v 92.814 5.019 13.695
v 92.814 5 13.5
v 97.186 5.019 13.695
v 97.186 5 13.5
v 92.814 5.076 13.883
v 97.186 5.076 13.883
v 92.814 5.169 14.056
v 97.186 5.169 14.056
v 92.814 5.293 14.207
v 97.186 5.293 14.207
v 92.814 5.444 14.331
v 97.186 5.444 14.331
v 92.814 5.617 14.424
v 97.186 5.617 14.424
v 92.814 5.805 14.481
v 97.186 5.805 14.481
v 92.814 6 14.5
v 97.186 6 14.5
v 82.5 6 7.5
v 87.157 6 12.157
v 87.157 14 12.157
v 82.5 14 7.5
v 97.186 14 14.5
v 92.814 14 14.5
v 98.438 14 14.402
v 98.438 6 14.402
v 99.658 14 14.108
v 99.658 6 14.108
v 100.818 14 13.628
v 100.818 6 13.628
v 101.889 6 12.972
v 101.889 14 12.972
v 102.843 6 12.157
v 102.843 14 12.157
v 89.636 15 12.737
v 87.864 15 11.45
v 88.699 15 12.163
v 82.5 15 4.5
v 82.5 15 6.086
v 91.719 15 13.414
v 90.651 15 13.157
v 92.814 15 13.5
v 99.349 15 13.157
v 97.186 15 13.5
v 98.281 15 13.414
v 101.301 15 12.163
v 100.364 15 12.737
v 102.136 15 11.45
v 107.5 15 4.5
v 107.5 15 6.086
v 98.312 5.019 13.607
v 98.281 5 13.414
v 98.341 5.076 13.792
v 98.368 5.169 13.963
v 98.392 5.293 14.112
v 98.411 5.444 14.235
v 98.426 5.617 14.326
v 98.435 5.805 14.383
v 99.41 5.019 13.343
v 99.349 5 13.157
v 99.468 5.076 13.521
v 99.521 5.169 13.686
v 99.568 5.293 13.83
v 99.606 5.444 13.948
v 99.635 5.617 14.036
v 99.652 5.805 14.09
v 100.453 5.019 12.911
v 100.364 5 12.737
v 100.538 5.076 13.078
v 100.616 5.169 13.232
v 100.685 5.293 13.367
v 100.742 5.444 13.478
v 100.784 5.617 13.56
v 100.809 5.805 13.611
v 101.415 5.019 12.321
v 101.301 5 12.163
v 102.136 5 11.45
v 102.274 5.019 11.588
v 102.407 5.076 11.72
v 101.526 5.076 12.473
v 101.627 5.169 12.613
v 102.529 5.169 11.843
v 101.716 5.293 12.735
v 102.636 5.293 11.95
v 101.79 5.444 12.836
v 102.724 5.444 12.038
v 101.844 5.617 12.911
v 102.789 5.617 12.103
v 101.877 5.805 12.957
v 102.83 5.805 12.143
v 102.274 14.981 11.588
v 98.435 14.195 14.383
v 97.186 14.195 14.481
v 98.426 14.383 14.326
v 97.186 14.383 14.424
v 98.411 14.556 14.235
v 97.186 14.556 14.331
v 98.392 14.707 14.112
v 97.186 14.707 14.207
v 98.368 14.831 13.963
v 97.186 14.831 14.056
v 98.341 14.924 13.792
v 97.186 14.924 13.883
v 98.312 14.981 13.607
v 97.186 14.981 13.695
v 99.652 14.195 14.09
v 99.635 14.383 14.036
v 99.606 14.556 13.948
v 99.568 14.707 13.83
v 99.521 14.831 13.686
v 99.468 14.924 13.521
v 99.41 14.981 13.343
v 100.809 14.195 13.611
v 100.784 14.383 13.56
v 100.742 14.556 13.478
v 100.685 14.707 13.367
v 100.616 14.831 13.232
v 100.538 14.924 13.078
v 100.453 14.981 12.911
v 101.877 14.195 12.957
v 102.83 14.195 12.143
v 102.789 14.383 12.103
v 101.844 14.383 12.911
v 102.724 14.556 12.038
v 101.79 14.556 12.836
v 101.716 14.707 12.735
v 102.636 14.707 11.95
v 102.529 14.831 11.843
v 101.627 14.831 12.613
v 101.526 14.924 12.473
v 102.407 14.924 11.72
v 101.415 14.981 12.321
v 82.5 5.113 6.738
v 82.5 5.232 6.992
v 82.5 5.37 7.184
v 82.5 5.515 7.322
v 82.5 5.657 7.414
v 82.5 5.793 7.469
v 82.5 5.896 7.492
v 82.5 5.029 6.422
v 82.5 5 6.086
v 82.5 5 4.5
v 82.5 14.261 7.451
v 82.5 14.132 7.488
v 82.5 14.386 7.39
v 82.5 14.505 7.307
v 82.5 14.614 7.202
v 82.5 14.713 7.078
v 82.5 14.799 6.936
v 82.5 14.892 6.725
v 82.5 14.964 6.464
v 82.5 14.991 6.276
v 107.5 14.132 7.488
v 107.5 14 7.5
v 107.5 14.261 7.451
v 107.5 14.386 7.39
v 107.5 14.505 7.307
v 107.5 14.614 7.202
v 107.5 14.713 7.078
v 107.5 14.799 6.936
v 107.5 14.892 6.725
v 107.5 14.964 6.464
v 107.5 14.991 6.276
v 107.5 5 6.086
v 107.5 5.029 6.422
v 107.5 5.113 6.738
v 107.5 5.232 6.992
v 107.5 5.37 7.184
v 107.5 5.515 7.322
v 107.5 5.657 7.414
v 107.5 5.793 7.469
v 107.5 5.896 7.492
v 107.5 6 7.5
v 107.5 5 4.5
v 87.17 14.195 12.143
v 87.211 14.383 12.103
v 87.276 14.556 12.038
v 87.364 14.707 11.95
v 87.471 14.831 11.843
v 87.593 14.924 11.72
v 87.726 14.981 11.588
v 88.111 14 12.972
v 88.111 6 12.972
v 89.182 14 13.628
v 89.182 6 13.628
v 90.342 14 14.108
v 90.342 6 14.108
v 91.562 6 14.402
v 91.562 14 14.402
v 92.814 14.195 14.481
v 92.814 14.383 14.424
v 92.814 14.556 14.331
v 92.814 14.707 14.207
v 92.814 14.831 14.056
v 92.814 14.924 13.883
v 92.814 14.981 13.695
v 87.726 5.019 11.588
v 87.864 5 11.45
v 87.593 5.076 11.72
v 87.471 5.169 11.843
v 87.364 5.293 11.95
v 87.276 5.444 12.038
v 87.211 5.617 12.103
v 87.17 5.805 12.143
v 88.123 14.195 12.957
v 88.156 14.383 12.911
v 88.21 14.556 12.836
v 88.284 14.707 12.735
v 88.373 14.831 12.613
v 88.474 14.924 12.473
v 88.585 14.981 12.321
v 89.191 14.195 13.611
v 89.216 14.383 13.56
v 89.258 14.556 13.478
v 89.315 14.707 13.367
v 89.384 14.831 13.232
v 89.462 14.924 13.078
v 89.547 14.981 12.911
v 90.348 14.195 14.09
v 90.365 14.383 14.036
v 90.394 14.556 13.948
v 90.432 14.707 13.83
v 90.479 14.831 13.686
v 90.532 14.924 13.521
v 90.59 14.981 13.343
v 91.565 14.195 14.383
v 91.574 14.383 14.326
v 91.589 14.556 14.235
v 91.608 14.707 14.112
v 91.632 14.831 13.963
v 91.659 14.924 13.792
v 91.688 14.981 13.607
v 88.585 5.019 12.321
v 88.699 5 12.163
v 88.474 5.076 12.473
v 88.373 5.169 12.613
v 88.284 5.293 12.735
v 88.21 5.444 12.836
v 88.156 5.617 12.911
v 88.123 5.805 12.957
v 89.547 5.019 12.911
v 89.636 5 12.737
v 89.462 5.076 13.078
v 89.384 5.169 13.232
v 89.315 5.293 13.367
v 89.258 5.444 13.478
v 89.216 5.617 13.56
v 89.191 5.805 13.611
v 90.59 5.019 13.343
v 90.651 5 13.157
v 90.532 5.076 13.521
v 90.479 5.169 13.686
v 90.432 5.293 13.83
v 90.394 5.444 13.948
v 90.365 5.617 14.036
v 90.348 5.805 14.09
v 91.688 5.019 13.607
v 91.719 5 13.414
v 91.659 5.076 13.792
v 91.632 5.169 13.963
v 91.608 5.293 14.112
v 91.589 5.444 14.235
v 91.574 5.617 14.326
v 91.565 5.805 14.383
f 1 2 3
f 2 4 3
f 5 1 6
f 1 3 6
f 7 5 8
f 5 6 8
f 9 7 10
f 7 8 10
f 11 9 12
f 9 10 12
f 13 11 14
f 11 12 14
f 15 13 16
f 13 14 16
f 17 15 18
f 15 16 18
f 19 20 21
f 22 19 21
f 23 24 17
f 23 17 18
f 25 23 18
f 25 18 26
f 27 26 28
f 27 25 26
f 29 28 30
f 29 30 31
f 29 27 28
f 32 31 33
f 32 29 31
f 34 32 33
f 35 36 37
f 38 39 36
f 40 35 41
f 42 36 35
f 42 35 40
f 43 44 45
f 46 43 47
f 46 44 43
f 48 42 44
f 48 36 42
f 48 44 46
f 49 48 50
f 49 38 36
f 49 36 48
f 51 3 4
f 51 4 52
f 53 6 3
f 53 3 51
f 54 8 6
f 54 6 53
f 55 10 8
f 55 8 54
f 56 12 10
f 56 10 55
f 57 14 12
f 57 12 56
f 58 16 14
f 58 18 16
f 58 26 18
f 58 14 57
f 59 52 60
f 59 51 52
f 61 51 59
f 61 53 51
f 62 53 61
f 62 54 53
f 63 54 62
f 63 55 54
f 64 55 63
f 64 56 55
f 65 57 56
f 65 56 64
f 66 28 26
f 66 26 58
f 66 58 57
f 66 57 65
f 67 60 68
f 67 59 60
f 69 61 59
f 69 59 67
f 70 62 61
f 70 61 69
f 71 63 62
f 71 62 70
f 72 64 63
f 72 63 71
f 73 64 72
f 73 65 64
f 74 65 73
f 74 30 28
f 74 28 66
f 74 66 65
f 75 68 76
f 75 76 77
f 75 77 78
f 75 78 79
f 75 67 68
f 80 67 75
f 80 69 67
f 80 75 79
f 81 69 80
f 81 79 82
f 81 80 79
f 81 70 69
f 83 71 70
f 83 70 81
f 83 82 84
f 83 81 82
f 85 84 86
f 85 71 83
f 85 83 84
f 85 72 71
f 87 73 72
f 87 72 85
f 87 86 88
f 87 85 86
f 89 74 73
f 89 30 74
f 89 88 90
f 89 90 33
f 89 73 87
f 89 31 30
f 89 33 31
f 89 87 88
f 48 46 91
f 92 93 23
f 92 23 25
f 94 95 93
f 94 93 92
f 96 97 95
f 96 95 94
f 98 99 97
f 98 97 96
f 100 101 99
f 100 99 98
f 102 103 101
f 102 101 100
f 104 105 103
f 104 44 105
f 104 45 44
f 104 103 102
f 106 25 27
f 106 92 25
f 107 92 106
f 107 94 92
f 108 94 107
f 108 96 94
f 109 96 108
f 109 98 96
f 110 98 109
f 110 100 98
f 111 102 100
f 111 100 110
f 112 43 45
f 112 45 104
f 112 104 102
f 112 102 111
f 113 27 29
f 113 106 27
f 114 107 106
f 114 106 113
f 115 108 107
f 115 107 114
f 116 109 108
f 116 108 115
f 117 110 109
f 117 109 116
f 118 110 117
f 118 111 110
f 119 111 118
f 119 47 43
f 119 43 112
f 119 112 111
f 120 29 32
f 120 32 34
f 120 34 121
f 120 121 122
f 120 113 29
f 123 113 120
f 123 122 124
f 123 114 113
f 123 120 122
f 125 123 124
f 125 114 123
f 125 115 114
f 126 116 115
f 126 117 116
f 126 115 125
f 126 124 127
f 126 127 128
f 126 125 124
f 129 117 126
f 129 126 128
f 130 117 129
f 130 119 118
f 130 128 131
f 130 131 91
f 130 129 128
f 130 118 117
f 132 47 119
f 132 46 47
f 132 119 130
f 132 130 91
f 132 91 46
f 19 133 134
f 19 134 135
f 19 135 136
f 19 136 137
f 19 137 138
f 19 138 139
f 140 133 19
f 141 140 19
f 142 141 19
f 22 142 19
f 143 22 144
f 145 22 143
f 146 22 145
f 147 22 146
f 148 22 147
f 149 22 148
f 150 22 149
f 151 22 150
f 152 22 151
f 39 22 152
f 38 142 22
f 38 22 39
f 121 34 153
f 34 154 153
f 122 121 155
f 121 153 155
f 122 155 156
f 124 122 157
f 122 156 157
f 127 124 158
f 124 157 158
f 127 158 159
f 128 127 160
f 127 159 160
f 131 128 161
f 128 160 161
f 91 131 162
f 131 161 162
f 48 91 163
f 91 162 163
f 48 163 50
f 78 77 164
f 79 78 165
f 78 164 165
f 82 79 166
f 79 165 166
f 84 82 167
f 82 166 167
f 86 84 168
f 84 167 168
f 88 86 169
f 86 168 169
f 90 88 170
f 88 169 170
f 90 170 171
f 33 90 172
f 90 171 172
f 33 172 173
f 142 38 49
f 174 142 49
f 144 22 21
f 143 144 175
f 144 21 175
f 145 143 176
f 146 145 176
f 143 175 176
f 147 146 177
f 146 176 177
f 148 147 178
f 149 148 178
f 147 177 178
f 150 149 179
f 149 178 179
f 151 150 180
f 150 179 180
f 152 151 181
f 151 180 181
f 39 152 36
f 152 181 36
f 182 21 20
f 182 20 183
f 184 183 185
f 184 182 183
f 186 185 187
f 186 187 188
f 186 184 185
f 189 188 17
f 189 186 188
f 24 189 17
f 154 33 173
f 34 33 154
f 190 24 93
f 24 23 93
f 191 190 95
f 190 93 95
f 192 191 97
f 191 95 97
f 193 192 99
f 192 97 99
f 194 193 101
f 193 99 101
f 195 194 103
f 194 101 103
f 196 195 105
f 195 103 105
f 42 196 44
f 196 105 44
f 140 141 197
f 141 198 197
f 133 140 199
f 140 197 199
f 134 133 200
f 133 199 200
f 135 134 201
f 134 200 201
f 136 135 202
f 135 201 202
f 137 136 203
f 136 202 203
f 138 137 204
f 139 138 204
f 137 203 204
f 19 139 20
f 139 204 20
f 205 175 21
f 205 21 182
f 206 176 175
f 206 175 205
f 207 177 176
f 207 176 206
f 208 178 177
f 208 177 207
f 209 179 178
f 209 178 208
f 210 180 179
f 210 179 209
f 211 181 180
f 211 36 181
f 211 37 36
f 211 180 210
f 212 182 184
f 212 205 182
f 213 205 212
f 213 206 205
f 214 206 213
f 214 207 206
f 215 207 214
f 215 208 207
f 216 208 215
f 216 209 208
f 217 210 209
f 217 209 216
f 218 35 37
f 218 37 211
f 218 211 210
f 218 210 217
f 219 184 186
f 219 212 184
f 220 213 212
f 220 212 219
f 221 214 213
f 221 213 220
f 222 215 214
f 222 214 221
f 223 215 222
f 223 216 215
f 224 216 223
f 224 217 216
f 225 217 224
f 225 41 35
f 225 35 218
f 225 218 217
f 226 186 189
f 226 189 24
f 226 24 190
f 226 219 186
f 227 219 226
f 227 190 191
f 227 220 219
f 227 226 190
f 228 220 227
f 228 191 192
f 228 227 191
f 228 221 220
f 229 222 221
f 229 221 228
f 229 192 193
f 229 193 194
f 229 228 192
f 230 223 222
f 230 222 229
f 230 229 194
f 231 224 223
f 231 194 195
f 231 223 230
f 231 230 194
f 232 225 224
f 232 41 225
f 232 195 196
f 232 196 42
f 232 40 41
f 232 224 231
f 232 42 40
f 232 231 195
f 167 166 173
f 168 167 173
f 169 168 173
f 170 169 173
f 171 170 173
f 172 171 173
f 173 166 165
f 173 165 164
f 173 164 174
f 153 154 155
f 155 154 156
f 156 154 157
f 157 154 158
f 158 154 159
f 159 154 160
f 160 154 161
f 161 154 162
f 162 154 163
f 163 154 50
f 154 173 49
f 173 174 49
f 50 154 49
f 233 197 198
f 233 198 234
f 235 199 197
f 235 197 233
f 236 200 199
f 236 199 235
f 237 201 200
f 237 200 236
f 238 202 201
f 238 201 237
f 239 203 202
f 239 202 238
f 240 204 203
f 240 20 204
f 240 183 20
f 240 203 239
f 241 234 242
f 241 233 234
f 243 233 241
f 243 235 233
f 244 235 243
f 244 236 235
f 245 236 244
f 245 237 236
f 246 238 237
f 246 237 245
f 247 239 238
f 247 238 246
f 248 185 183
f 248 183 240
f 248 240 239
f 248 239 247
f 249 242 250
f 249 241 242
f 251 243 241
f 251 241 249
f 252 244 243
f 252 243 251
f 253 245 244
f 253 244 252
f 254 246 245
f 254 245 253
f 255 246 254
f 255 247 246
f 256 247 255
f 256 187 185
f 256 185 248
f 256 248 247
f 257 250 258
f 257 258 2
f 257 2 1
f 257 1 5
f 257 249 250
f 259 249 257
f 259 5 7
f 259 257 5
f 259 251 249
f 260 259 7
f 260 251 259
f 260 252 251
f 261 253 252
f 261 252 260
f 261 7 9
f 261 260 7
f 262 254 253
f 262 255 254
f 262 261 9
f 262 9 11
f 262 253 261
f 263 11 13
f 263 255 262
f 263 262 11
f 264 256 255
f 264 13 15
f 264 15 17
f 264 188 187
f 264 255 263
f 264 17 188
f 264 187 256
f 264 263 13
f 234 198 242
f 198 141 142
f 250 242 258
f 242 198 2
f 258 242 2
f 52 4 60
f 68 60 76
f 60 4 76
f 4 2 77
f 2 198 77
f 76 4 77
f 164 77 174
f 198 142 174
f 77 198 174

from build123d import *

# Parameters (mm, degrees)
BOX006_W             = 25
BOX006_H             = 10
BOX006_DEPTH         = 10
CHAMFER003_SIZE      = 7
FILLET002003_R       = 8
FILLET002008005008_R = 1


with BuildPart() as part:
    # Box006 → Box006 (new body)
    with BuildSketch(Plane(origin=(85, 5, 30), x_dir=(1, 0, 0), z_dir=(0, 0, 1))):
        with Locations((12.5, 5)):
            Rectangle(BOX006_W, BOX006_H)
    extrude(amount=BOX006_DEPTH)

    # Chamfer003
    chamfer003_edges = [part.edges().sort_by_distance(p)[0] for p in [
        (85, 10, 40),
        (110, 10, 40),
    ]]
    chamfer(chamfer003_edges, length=CHAMFER003_SIZE)

    # Fillet002003
    fillet002003_edges = [part.edges().sort_by_distance(p)[0] for p in [
        (92, 10, 40),
        (103, 10, 40),
    ]]
    fillet(fillet002003_edges, radius=FILLET002003_R)


with BuildPart() as part_1:
    # Fillet002003 placement: moved
    add(part.part.moved(Location((-7.5, 0, -3))))

    # Fillet002008005008
    fillet002008005008_edges = [part_1.edges().sort_by_distance(p)[0] for p in [
        (95.247759, 5, 36.391036),
        (95.247759, 15, 36.391036),
    ]]
    fillet(fillet002008005008_edges, radius=FILLET002008005008_R)


with BuildPart() as part_2:
    # Fillet002008005008 placement: moved
    add(part_1.part.moved(Location((5, 0, -22.5))))


solid = part_2.part
